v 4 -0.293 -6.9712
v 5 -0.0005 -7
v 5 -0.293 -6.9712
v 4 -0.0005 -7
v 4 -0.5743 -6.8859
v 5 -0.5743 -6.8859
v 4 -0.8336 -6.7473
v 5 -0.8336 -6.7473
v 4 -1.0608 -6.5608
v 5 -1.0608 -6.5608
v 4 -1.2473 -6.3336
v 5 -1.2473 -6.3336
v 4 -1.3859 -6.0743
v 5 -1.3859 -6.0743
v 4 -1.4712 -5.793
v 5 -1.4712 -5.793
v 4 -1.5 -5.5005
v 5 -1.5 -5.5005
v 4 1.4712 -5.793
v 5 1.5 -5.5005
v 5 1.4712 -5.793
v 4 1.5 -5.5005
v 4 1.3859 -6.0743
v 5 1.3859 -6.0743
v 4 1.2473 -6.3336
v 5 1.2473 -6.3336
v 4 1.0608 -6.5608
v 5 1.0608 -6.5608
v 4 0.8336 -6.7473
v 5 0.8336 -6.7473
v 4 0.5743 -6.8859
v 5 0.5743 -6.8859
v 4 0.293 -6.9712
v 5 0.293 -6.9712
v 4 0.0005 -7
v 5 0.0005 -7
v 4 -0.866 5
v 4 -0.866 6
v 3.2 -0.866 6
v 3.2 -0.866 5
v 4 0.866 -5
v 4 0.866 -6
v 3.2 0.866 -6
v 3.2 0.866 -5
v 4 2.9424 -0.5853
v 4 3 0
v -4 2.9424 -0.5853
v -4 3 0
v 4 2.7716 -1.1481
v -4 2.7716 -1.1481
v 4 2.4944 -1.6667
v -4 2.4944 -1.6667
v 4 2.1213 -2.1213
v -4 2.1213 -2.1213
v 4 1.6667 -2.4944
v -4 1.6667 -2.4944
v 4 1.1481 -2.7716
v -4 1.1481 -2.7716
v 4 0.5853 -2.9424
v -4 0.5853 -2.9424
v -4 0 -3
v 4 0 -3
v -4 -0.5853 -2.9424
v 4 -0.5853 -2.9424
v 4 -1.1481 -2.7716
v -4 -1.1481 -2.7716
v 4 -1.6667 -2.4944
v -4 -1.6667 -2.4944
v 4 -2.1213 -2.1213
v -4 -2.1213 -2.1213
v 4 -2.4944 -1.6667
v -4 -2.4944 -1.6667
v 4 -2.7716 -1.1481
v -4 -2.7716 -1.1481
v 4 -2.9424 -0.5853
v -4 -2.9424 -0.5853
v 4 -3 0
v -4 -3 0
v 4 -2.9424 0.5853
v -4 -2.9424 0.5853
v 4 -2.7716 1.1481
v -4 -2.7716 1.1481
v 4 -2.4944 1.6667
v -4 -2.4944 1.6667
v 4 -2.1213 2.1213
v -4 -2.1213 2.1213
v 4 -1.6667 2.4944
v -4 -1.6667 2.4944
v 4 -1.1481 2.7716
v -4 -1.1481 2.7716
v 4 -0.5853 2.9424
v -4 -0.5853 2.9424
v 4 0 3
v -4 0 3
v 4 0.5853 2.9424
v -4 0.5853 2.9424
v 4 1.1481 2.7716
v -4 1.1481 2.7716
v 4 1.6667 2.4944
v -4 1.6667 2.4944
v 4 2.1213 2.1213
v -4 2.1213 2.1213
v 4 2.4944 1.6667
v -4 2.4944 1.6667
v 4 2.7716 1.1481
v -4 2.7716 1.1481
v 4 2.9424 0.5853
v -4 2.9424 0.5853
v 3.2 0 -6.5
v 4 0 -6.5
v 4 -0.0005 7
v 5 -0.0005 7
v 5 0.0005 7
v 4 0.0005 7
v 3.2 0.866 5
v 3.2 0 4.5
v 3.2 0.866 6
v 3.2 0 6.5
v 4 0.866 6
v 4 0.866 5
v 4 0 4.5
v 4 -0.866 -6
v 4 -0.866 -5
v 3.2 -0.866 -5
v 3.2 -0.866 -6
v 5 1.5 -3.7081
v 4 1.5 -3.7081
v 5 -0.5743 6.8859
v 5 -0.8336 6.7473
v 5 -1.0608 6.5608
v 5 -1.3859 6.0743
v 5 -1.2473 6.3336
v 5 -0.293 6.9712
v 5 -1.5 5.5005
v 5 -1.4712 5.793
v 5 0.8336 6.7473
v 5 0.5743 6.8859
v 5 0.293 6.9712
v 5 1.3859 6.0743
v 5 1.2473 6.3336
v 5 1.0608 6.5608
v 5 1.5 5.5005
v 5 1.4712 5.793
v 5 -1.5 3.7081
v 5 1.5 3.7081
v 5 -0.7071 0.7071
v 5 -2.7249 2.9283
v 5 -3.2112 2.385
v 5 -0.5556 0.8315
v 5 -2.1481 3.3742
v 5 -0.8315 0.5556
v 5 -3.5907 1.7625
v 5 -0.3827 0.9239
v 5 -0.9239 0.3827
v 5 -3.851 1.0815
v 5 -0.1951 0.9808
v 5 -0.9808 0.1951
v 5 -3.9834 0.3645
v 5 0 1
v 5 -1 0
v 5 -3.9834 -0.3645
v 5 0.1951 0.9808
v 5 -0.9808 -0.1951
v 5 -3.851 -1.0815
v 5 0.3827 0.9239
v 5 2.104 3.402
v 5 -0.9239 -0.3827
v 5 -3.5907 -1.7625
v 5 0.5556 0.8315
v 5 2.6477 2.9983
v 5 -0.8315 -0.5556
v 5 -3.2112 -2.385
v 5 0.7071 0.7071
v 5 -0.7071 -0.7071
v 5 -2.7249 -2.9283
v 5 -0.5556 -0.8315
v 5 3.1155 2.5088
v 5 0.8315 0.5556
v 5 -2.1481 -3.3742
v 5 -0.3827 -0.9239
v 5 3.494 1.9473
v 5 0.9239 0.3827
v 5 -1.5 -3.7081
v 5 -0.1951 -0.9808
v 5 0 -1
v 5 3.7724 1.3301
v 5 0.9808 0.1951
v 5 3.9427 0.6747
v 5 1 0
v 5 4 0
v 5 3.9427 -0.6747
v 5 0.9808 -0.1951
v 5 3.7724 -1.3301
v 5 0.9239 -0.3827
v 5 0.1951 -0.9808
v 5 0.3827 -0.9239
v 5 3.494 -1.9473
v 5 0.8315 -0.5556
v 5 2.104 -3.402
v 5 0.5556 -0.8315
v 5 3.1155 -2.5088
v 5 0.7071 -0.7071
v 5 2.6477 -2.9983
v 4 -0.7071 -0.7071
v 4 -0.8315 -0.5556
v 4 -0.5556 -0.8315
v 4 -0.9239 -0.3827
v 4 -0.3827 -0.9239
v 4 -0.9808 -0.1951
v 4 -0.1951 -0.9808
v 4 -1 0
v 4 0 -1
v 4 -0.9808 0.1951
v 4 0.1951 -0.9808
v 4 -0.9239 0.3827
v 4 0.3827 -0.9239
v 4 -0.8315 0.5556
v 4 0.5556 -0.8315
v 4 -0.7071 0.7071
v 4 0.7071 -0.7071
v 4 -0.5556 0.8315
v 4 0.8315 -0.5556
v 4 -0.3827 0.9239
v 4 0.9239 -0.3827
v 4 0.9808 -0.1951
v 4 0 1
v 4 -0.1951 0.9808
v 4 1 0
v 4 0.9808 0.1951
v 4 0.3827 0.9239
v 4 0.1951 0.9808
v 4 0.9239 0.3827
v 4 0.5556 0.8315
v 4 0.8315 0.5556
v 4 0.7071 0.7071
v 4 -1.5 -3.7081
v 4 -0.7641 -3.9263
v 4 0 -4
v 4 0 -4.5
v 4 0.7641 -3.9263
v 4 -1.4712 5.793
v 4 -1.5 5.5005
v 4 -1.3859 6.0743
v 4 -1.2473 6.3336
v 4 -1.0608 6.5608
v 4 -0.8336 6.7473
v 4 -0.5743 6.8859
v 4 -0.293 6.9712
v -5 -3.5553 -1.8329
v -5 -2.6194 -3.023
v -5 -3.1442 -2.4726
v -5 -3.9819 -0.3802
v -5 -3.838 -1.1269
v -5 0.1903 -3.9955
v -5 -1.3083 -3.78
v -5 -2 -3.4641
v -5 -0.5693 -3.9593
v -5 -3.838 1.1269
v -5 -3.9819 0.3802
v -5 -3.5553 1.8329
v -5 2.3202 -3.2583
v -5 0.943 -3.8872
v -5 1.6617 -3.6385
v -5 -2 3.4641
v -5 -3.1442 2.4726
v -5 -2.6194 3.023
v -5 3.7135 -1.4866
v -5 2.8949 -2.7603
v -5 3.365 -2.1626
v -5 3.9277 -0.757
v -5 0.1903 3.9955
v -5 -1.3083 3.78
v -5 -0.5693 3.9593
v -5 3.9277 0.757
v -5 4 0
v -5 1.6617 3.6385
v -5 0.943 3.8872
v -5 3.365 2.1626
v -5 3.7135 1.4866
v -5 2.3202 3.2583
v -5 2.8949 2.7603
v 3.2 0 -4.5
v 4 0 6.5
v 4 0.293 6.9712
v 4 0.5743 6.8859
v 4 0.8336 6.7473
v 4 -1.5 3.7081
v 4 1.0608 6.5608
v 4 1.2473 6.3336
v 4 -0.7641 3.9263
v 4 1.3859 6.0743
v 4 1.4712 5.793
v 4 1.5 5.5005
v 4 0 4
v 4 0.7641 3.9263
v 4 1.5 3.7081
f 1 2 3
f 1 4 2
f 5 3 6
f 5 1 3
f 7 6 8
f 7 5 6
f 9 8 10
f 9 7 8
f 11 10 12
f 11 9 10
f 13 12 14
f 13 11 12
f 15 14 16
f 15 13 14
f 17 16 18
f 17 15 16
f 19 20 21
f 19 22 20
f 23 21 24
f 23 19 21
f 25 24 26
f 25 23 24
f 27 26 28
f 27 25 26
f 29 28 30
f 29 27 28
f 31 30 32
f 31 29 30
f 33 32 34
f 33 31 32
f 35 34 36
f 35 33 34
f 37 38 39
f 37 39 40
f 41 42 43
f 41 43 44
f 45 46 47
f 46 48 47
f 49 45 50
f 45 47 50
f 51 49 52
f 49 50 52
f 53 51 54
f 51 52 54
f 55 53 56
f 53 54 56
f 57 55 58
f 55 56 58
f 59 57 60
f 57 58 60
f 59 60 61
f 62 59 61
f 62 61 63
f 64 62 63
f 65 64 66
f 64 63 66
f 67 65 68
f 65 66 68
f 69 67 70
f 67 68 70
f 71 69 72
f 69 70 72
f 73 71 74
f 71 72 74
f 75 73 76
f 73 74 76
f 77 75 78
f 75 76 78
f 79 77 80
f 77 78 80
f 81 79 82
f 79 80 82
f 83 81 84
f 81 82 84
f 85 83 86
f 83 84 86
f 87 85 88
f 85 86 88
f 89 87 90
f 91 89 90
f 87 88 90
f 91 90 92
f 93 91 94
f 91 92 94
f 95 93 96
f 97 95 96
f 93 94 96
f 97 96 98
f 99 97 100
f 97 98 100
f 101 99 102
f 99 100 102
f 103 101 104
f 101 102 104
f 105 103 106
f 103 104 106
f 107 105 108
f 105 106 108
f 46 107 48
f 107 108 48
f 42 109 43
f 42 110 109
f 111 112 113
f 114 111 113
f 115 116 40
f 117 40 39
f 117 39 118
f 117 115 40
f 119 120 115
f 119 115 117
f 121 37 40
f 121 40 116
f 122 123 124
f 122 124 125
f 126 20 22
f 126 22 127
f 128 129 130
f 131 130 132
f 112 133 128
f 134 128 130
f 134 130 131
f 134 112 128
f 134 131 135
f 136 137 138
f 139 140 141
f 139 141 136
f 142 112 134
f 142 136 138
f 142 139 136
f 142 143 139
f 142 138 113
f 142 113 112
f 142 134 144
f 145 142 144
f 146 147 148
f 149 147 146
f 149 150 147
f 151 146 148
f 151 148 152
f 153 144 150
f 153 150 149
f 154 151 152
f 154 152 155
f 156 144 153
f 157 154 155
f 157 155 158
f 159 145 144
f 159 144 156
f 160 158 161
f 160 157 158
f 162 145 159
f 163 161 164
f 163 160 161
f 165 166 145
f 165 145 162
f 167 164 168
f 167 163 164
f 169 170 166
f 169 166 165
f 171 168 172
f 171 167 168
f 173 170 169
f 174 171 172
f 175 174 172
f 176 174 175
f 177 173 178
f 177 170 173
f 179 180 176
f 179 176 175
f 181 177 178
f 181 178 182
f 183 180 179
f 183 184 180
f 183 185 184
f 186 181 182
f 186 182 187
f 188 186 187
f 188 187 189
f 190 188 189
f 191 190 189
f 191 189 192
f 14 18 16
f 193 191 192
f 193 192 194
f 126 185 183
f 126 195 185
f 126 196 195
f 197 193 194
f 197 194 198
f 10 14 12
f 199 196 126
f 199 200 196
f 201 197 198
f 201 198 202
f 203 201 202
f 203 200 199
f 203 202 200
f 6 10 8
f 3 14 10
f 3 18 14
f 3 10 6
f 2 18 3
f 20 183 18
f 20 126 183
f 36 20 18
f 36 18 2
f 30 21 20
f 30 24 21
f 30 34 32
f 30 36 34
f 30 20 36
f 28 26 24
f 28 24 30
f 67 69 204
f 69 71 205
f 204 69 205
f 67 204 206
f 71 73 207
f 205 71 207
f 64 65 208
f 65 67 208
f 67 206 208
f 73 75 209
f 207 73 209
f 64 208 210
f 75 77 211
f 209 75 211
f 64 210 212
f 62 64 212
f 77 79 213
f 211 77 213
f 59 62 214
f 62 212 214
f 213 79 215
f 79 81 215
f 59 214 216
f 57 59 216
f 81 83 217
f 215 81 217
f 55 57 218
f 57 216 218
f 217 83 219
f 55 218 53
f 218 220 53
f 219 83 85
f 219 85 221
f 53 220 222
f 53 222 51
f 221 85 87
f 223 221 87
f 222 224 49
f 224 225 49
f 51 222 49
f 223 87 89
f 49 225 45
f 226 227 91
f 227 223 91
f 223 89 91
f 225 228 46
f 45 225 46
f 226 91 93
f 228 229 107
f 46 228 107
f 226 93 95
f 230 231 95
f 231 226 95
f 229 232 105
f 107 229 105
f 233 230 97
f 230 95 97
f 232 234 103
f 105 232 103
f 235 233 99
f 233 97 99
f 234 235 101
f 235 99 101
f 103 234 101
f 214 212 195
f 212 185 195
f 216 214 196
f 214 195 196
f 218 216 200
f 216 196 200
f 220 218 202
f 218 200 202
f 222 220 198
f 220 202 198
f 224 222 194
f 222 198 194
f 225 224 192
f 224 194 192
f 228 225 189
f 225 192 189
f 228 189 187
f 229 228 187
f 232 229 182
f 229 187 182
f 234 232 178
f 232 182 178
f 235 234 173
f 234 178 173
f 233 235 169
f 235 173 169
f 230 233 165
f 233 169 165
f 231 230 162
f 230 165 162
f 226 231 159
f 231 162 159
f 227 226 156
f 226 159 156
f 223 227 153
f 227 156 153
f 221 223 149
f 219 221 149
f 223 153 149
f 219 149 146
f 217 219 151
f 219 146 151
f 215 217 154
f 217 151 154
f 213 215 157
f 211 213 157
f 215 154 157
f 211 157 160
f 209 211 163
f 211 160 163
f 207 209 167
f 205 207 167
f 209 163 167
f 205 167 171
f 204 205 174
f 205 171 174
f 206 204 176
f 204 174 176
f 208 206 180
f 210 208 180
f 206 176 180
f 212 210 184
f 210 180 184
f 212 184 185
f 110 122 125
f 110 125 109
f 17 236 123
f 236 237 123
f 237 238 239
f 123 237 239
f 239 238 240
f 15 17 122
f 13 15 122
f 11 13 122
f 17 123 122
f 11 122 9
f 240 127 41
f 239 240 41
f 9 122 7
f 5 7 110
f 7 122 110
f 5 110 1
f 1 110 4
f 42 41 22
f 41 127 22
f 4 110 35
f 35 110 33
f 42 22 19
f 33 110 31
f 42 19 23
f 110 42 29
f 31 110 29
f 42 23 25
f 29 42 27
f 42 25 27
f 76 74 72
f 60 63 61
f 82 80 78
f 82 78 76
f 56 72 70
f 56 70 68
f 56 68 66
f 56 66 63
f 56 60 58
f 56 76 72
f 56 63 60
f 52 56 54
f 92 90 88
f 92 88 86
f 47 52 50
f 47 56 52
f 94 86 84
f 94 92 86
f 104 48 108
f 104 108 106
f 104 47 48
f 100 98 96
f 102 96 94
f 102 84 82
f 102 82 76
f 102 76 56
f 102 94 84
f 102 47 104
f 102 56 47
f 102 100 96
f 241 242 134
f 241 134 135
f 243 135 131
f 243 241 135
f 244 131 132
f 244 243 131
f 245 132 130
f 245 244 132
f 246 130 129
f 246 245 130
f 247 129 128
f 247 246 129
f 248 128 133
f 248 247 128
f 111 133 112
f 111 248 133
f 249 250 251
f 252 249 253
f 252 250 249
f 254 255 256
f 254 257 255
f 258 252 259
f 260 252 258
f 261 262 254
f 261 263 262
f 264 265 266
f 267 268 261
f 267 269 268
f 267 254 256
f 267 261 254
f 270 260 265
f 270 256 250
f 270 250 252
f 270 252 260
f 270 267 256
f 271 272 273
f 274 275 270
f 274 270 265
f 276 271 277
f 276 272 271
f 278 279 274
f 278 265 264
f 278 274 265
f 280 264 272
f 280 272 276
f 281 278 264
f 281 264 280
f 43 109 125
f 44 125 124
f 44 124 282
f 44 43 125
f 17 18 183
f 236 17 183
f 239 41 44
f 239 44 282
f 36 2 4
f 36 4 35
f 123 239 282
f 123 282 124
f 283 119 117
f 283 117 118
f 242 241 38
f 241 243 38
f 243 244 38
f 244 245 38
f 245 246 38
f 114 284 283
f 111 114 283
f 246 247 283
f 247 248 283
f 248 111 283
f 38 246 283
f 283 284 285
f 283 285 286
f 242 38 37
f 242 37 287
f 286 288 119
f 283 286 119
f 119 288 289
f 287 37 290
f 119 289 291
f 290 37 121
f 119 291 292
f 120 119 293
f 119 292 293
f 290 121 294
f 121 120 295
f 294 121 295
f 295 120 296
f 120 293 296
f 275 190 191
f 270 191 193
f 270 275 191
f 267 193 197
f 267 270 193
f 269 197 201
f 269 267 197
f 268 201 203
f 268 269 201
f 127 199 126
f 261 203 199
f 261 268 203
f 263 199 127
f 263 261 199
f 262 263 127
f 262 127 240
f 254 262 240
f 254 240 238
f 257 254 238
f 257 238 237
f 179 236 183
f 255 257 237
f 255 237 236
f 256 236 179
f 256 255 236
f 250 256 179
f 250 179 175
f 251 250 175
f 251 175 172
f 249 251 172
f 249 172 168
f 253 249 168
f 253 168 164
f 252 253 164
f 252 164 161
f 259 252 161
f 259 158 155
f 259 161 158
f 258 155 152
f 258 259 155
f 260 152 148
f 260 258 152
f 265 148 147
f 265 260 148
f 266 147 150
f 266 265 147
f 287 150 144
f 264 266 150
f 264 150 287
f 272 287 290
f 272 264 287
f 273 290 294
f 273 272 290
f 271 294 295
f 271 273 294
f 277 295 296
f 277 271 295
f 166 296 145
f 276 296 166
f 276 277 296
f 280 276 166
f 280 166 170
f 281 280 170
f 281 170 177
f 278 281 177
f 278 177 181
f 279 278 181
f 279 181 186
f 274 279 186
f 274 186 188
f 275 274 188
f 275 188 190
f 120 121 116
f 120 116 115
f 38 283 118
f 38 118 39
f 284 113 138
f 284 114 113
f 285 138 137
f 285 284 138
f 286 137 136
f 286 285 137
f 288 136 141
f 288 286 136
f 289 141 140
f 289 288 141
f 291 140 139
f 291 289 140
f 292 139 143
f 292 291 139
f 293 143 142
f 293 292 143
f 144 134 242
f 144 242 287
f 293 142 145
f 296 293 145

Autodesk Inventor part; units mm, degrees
ref_plane "YZ Plane" through (0, 0, 0) normal (1, 0, 0) x (0, 1, 0)
ref_plane "XZ Plane" through (0, 0, 0) normal (0, 1, 0) x (-1, 0, 0)
ref_plane "XY Plane" through (0, 0, 0) normal (0, 0, 1) x (1, 0, 0)
sketch "Sketch1" plane through (0, 0, 0) normal (0, 0, 1) x (1, 0, 0)
  line L0 (0, 0) -> (0, 4) construction
  line L1 (0, 4) -> (5, 4)
  line L2 (5, 4) -> (5, 0)
  line L3 (5, 0) -> (4, 0)
  line L4 (4, 0) -> (4, 3)
  line L5 (4, 3) -> (0, 3)
  line L6 (0, 0) -> (55.2609, 0) construction
  line L7 (0, 4) -> (-5, 4)
  line L8 (-5, 4) -> (-5, 0) construction
  line L9 (-4, 0) -> (-4, 3) construction
  line L10 (-4, 3) -> (0, 3)
  line L11 (-5, 1.5) -> (-4, 1.5)
  line L12 (-5, 1.5) -> (-5, 4)
  line L13 (-4, 1.5) -> (-4, 3)
  dimension "d0" = 1
  dimension "d1" = 3
  dimension "d2" = 0
  dimension "d3" = 1
  dimension "d4" = 5
  dimension "d5" = 1.5
revolve "Revolution1" add sketch "Sketch1" angle 360 about axis through (0, 0, 0) along (1, 0, 0)
sketch "Sketch6" plane through (5, 0, 0) normal (1, 0, 0) x (0, 0, -1)
  line L0 (0, 0) -> (-7, 0) construction
  line L1 (-7, 0) -> (-7, 1.5)
  line L2 (-7, 1.5) -> (-3.4641, 1.5)
  line L3 (0, 0) -> (0, 4) construction
  line L4 (-7, 0) -> (-7, -1.5)
  line L5 (-7, -1.5) -> (-3.4641, -1.5)
  line L6 (0, 0) -> (7, 0) construction
  line L7 (7, 0) -> (7, 1.5)
  line L8 (7, 1.5) -> (3.4641, 1.5)
  line L9 (7, 0) -> (7, -1.5)
  line L10 (7, -1.5) -> (3.4641, -1.5)
  arc A0 (-3.4641, 1.5) -> (-3.4641, -1.5) centre (0, 0) ccw construction
  arc A1 (3.4641, -1.5) -> (3.4641, 1.5) centre (0, 0) ccw construction
  line L11 (-7, -1.5) -> (-7, 1.5) construction
  line L12 (7, -1.5) -> (7, 1.5) construction
  line L13 (-7, 1.5) -> (7, 1.5)
  line L14 (-7, -1.5) -> (7, -1.5)
  dimension "d30" = 1.5
  dimension "d31" = 7
extrude "Extrusion5" add sketch "Sketch6" against normal blind 1
fillet "Fillet2" radius 1.5 4 edges at (4.5, -1.5, 7) (4.5, 1.5, 7) (4.5, -1.5, -7) (4.5, 1.5, -7)
sketch "Sketch7" plane through (4, 0, 0) normal (-1, 0, 0) x (0, 0, 1)
  arc A0 (5.5, -1.5) -> (5.5, 1.5) centre (5.5, 0) ccw projected
  arc A1 (-5.5, 1.5) -> (-5.5, -1.5) centre (-5.5, 0) ccw projected
  line L0 (-3.7081, -1.5) -> (-5.5, -1.5) projected
  arc A2 (-3.7081, 1.5) -> (-3.7081, -1.5) centre (0, 0) ccw projected
  line L1 (-5.5, 1.5) -> (-3.7081, 1.5) projected
  line L2 (6, 0.866) -> (6.5, 0)
  line L3 (6.5, 0) -> (6, -0.866)
  line L4 (6, -0.866) -> (5, -0.866)
  line L5 (5, -0.866) -> (4.5, 0)
  line L6 (4.5, 0) -> (5, 0.866)
  line L7 (5, 0.866) -> (6, 0.866)
  line L8 (-5, 0.866) -> (-4.5, 0)
  line L9 (-4.5, 0) -> (-5, -0.866)
  line L10 (-5, -0.866) -> (-6, -0.866)
  line L11 (-6, -0.866) -> (-6.5, 0)
  line L12 (-6.5, 0) -> (-6, 0.866)
  line L13 (-6, 0.866) -> (-5, 0.866)
  dimension "d35" = 1
extrude "Extrusion6" add sketch "Sketch7" along normal blind 0.8 contours L2 L3 L4 L5 L6 L7 | L8 L9 L10 L11 L12 L13
sketch "Sketch8" plane through (5, 0, 0) normal (1, 0, 0) x (0, 0, -1)
  arc A0 (3.7081, 1.5) -> (-3.7081, 1.5) centre (0, 0) ccw projected
  circle A1 centre (0, 0) radius 1
  dimension "d38" = 2
extrude "Extrusion7" cut sketch "Sketch8" against normal blind 10
sketch "Sketch9" plane through (-5, 0, 0) normal (-1, 0, 0) x (0, 0, 1)
  circle A0 centre (0, 0) radius 1.5 projected
extrude "Extrusion8" add sketch "Sketch9" against normal blind 1
properties part number "Cylinder"
